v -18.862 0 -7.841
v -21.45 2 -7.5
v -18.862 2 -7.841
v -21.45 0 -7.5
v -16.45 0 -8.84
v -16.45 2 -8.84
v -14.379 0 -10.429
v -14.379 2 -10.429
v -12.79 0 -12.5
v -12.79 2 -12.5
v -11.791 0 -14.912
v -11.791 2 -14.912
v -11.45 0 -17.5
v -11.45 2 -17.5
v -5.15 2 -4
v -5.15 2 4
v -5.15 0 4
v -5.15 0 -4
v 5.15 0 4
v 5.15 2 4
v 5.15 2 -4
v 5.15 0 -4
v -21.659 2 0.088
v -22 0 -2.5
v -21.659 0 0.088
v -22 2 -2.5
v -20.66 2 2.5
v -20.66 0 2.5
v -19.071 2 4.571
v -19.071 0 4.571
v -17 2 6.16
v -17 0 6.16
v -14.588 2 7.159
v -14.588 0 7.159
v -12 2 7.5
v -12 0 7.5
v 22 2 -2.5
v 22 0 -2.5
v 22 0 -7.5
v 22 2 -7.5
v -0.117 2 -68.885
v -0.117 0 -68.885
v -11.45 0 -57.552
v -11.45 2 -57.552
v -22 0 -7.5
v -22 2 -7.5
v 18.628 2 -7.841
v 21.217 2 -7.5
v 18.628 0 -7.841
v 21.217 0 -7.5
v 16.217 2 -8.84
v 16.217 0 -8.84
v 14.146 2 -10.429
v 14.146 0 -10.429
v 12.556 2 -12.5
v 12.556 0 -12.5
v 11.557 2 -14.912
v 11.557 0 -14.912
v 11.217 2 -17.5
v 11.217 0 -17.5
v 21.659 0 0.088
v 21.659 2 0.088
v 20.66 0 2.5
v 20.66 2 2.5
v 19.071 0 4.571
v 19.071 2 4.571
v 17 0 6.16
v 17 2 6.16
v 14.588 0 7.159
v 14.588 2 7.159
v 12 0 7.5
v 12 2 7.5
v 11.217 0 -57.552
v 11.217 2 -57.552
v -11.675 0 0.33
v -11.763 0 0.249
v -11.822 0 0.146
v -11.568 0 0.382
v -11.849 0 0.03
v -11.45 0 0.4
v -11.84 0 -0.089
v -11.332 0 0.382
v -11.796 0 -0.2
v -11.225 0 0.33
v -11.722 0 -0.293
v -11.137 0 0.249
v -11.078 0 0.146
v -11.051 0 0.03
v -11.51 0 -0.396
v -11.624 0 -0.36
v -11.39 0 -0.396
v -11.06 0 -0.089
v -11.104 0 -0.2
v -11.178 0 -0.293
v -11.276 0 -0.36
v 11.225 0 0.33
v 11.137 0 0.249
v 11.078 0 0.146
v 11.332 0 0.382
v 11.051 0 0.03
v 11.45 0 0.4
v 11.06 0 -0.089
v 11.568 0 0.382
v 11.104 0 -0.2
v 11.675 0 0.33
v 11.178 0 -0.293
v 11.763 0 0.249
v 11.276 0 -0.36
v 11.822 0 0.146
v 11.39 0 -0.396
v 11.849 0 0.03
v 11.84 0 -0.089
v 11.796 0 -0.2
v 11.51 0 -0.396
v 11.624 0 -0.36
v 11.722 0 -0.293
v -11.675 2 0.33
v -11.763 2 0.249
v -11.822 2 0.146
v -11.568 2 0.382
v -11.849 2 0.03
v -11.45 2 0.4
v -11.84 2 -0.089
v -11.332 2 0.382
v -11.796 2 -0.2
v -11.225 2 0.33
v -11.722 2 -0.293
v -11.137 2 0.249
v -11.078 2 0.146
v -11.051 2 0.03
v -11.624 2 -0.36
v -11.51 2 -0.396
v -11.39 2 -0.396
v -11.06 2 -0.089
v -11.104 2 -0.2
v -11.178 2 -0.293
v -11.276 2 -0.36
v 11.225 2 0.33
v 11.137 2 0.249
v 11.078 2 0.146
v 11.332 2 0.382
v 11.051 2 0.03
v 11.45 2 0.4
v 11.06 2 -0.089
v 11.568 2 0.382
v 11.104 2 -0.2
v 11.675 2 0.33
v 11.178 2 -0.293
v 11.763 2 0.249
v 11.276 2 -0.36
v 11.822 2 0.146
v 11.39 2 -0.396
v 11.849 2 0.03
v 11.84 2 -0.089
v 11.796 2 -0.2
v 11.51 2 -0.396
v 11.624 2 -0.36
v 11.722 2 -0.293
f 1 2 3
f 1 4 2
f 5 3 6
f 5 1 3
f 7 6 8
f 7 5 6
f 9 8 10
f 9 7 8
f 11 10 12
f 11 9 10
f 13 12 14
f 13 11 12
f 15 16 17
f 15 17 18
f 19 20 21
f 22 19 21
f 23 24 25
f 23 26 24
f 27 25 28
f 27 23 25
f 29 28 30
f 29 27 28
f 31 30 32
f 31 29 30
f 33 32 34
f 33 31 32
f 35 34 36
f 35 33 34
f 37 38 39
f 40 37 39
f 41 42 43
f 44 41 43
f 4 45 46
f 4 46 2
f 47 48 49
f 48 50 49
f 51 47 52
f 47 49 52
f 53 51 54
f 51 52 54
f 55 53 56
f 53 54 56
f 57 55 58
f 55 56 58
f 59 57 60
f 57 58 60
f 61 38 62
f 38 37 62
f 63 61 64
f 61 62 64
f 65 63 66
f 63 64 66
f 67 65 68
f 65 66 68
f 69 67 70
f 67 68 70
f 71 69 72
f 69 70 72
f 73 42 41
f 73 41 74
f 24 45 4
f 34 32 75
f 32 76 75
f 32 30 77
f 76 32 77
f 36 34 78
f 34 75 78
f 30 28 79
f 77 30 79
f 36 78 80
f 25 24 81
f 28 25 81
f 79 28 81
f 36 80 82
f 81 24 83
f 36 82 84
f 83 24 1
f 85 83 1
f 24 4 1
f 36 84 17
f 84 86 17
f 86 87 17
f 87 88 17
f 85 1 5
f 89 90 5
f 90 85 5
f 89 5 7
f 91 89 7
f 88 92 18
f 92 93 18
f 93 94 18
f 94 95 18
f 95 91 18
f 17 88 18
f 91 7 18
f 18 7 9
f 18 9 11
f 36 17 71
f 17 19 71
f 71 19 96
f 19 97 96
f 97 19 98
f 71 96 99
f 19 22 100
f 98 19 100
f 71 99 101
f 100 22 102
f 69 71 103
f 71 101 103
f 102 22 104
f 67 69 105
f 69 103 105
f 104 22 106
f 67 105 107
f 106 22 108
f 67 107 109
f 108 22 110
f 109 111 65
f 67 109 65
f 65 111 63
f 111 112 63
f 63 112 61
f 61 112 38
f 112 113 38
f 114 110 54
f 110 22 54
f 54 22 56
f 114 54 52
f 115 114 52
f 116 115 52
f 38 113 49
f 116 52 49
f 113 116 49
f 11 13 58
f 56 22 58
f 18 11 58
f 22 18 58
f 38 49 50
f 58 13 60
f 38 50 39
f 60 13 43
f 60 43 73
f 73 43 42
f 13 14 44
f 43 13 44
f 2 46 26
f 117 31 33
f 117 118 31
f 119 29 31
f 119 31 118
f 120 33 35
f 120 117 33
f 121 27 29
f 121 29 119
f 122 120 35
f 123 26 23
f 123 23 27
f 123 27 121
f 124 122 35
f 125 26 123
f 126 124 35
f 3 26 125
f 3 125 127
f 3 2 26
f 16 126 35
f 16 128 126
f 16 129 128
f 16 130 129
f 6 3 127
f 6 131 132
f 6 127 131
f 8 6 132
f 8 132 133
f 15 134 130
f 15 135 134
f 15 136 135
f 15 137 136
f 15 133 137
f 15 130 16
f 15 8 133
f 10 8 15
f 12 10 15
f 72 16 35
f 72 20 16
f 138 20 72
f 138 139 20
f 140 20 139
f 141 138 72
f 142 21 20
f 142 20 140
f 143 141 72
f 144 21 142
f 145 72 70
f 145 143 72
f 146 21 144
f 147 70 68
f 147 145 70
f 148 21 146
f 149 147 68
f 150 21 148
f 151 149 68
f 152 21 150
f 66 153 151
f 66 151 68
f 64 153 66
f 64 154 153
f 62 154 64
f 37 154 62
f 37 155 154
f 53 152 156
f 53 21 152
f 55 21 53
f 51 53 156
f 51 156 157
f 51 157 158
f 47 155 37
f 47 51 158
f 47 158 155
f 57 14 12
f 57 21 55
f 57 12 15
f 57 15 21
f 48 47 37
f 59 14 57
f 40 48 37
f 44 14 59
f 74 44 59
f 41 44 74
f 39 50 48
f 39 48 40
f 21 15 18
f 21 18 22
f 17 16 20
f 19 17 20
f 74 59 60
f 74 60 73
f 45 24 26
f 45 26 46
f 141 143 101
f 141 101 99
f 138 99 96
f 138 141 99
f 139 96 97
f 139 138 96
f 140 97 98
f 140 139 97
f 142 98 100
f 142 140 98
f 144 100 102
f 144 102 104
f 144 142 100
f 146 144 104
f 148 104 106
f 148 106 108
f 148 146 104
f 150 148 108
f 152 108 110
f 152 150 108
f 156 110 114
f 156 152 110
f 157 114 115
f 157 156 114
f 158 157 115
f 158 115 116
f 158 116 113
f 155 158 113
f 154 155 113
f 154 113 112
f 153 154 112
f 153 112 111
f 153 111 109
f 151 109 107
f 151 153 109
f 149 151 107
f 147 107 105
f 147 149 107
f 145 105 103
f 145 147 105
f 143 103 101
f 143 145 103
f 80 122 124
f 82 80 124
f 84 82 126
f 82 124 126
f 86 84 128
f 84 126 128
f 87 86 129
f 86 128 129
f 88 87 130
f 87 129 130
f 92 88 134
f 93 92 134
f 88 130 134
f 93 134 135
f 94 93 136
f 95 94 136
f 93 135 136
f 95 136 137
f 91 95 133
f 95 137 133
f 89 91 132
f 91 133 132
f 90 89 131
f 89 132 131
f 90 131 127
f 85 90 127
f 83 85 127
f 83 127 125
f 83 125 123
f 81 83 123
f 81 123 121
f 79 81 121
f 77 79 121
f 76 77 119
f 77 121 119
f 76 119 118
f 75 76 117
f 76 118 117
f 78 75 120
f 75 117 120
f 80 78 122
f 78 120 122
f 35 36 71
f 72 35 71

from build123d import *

# Parameters (mm, degrees)
SKETCH2_W               = 44
SKETCH2_H               = 15
BOSS_EXTRUDE1_DEPTH     = 2
SKETCH3_W               = 10.3
SKETCH3_H               = 8
CUT_EXTRUDE1_DEPTH      = 2
SKETCH5_R               = 0.4
CUT_EXTRUDE2_DEPTH      = 2
SKETCH6_W               = 22.666596939
SKETCH6_H               = 61.385041888
BOSS_EXTRUDE3_DEPTH     = 2
FILLET1_R               = 10
CUT_EXTRUDE3_DEPTH      = 73.340507297
CUT_EXTRUDE3_DEPTH_BACK = 2
CUT_EXTRUDE4_DEPTH      = 73.340507297
CUT_EXTRUDE4_DEPTH_BACK = 2
FILLET2_R               = 10


with BuildPart() as part:
    # Sketch2 → Boss-Extrude1 (new body)
    with BuildSketch(Plane(origin=(0, 0, 0), x_dir=(1, 0, 0), z_dir=(0, 1, 0))):
        Rectangle(SKETCH2_W, SKETCH2_H)
    extrude(amount=BOSS_EXTRUDE1_DEPTH)

    # Sketch3 → Cut-Extrude1 (cut)
    with BuildSketch(Plane(origin=(0, 2, 0), x_dir=(1, 0, 0), z_dir=(0, 1, 0))):
        Rectangle(SKETCH3_W, SKETCH3_H)
    extrude(amount=-CUT_EXTRUDE1_DEPTH, mode=Mode.SUBTRACT)

    # Sketch5 → Cut-Extrude2 (cut)
    with BuildSketch(Plane(origin=(0, 2, 0), x_dir=(1, 0, 0), z_dir=(0, 1, 0))):
        with Locations(Location((-11.45, 0, 0), (0, 0, 270))):
            Circle(SKETCH5_R)
    cut_extrude2 = extrude(amount=-CUT_EXTRUDE2_DEPTH, mode=Mode.SUBTRACT)

    # Mirror1: Cut-Extrude2 across plane
    add(cut_extrude2.mirror(Plane(origin=(0, 0, 0), x_dir=(0, 0, 1), z_dir=(1, 0, 0))), mode=Mode.SUBTRACT)

    # Sketch6 → Boss-Extrude3 (add)
    with BuildSketch(Plane(origin=(0, 2, 0), x_dir=(1, 0, 0), z_dir=(0, 1, 0))):
        with Locations((-0.116701531, 38.192520944)):
            Rectangle(SKETCH6_W, SKETCH6_H)
    extrude(amount=-BOSS_EXTRUDE3_DEPTH)

    # Fillet1
    fillet1_edges = [part.edges().sort_by_distance(p)[0] for p in [
        (-11.45, 1, -7.5),
        (11.216596939, 1, -7.5),
    ]]
    fillet(fillet1_edges, radius=FILLET1_R)

    # Sketch8 → Cut-Extrude3 (cut, two sides: drawn at the far end of the back side and taken through both)
    with BuildSketch(Plane(origin=(0, 2, 0), x_dir=(1, 0, 0), z_dir=(0, 1, 0)).offset(-CUT_EXTRUDE3_DEPTH_BACK)):
        Polygon((119.416120766, 188.417864185), (-0.11670153, 68.885041888), (-11.45, 57.551743419), (-130.982822296, -61.981078878), (-370.048466889, 177.084565715), (-119.649523827, 427.483508777), align=None)
    extrude(amount=CUT_EXTRUDE3_DEPTH + CUT_EXTRUDE3_DEPTH_BACK, mode=Mode.SUBTRACT)

    # Sketch9 → Cut-Extrude4 (cut, two sides: drawn at the far end of the back side and taken through both)
    with BuildSketch(Plane(origin=(0, 2, 0), x_dir=(1, 0, 0), z_dir=(0, 1, 0)).offset(-CUT_EXTRUDE4_DEPTH_BACK)):
        Polygon((-119.649523827, 188.417864185), (-0.11670153, 68.885041888), (11.216596939, 57.551743419), (130.749419236, -61.981078878), (369.815063828, 177.084565715), (119.416120766, 427.483508777), align=None)
    extrude(amount=CUT_EXTRUDE4_DEPTH + CUT_EXTRUDE4_DEPTH_BACK, mode=Mode.SUBTRACT)

    # Fillet2
    fillet2_edges = [part.edges().sort_by_distance(p)[0] for p in [
        (22, 1, 7.5),
        (-22, 1, 7.5),
    ]]
    fillet(fillet2_edges, radius=FILLET2_R)


solid = part.part
